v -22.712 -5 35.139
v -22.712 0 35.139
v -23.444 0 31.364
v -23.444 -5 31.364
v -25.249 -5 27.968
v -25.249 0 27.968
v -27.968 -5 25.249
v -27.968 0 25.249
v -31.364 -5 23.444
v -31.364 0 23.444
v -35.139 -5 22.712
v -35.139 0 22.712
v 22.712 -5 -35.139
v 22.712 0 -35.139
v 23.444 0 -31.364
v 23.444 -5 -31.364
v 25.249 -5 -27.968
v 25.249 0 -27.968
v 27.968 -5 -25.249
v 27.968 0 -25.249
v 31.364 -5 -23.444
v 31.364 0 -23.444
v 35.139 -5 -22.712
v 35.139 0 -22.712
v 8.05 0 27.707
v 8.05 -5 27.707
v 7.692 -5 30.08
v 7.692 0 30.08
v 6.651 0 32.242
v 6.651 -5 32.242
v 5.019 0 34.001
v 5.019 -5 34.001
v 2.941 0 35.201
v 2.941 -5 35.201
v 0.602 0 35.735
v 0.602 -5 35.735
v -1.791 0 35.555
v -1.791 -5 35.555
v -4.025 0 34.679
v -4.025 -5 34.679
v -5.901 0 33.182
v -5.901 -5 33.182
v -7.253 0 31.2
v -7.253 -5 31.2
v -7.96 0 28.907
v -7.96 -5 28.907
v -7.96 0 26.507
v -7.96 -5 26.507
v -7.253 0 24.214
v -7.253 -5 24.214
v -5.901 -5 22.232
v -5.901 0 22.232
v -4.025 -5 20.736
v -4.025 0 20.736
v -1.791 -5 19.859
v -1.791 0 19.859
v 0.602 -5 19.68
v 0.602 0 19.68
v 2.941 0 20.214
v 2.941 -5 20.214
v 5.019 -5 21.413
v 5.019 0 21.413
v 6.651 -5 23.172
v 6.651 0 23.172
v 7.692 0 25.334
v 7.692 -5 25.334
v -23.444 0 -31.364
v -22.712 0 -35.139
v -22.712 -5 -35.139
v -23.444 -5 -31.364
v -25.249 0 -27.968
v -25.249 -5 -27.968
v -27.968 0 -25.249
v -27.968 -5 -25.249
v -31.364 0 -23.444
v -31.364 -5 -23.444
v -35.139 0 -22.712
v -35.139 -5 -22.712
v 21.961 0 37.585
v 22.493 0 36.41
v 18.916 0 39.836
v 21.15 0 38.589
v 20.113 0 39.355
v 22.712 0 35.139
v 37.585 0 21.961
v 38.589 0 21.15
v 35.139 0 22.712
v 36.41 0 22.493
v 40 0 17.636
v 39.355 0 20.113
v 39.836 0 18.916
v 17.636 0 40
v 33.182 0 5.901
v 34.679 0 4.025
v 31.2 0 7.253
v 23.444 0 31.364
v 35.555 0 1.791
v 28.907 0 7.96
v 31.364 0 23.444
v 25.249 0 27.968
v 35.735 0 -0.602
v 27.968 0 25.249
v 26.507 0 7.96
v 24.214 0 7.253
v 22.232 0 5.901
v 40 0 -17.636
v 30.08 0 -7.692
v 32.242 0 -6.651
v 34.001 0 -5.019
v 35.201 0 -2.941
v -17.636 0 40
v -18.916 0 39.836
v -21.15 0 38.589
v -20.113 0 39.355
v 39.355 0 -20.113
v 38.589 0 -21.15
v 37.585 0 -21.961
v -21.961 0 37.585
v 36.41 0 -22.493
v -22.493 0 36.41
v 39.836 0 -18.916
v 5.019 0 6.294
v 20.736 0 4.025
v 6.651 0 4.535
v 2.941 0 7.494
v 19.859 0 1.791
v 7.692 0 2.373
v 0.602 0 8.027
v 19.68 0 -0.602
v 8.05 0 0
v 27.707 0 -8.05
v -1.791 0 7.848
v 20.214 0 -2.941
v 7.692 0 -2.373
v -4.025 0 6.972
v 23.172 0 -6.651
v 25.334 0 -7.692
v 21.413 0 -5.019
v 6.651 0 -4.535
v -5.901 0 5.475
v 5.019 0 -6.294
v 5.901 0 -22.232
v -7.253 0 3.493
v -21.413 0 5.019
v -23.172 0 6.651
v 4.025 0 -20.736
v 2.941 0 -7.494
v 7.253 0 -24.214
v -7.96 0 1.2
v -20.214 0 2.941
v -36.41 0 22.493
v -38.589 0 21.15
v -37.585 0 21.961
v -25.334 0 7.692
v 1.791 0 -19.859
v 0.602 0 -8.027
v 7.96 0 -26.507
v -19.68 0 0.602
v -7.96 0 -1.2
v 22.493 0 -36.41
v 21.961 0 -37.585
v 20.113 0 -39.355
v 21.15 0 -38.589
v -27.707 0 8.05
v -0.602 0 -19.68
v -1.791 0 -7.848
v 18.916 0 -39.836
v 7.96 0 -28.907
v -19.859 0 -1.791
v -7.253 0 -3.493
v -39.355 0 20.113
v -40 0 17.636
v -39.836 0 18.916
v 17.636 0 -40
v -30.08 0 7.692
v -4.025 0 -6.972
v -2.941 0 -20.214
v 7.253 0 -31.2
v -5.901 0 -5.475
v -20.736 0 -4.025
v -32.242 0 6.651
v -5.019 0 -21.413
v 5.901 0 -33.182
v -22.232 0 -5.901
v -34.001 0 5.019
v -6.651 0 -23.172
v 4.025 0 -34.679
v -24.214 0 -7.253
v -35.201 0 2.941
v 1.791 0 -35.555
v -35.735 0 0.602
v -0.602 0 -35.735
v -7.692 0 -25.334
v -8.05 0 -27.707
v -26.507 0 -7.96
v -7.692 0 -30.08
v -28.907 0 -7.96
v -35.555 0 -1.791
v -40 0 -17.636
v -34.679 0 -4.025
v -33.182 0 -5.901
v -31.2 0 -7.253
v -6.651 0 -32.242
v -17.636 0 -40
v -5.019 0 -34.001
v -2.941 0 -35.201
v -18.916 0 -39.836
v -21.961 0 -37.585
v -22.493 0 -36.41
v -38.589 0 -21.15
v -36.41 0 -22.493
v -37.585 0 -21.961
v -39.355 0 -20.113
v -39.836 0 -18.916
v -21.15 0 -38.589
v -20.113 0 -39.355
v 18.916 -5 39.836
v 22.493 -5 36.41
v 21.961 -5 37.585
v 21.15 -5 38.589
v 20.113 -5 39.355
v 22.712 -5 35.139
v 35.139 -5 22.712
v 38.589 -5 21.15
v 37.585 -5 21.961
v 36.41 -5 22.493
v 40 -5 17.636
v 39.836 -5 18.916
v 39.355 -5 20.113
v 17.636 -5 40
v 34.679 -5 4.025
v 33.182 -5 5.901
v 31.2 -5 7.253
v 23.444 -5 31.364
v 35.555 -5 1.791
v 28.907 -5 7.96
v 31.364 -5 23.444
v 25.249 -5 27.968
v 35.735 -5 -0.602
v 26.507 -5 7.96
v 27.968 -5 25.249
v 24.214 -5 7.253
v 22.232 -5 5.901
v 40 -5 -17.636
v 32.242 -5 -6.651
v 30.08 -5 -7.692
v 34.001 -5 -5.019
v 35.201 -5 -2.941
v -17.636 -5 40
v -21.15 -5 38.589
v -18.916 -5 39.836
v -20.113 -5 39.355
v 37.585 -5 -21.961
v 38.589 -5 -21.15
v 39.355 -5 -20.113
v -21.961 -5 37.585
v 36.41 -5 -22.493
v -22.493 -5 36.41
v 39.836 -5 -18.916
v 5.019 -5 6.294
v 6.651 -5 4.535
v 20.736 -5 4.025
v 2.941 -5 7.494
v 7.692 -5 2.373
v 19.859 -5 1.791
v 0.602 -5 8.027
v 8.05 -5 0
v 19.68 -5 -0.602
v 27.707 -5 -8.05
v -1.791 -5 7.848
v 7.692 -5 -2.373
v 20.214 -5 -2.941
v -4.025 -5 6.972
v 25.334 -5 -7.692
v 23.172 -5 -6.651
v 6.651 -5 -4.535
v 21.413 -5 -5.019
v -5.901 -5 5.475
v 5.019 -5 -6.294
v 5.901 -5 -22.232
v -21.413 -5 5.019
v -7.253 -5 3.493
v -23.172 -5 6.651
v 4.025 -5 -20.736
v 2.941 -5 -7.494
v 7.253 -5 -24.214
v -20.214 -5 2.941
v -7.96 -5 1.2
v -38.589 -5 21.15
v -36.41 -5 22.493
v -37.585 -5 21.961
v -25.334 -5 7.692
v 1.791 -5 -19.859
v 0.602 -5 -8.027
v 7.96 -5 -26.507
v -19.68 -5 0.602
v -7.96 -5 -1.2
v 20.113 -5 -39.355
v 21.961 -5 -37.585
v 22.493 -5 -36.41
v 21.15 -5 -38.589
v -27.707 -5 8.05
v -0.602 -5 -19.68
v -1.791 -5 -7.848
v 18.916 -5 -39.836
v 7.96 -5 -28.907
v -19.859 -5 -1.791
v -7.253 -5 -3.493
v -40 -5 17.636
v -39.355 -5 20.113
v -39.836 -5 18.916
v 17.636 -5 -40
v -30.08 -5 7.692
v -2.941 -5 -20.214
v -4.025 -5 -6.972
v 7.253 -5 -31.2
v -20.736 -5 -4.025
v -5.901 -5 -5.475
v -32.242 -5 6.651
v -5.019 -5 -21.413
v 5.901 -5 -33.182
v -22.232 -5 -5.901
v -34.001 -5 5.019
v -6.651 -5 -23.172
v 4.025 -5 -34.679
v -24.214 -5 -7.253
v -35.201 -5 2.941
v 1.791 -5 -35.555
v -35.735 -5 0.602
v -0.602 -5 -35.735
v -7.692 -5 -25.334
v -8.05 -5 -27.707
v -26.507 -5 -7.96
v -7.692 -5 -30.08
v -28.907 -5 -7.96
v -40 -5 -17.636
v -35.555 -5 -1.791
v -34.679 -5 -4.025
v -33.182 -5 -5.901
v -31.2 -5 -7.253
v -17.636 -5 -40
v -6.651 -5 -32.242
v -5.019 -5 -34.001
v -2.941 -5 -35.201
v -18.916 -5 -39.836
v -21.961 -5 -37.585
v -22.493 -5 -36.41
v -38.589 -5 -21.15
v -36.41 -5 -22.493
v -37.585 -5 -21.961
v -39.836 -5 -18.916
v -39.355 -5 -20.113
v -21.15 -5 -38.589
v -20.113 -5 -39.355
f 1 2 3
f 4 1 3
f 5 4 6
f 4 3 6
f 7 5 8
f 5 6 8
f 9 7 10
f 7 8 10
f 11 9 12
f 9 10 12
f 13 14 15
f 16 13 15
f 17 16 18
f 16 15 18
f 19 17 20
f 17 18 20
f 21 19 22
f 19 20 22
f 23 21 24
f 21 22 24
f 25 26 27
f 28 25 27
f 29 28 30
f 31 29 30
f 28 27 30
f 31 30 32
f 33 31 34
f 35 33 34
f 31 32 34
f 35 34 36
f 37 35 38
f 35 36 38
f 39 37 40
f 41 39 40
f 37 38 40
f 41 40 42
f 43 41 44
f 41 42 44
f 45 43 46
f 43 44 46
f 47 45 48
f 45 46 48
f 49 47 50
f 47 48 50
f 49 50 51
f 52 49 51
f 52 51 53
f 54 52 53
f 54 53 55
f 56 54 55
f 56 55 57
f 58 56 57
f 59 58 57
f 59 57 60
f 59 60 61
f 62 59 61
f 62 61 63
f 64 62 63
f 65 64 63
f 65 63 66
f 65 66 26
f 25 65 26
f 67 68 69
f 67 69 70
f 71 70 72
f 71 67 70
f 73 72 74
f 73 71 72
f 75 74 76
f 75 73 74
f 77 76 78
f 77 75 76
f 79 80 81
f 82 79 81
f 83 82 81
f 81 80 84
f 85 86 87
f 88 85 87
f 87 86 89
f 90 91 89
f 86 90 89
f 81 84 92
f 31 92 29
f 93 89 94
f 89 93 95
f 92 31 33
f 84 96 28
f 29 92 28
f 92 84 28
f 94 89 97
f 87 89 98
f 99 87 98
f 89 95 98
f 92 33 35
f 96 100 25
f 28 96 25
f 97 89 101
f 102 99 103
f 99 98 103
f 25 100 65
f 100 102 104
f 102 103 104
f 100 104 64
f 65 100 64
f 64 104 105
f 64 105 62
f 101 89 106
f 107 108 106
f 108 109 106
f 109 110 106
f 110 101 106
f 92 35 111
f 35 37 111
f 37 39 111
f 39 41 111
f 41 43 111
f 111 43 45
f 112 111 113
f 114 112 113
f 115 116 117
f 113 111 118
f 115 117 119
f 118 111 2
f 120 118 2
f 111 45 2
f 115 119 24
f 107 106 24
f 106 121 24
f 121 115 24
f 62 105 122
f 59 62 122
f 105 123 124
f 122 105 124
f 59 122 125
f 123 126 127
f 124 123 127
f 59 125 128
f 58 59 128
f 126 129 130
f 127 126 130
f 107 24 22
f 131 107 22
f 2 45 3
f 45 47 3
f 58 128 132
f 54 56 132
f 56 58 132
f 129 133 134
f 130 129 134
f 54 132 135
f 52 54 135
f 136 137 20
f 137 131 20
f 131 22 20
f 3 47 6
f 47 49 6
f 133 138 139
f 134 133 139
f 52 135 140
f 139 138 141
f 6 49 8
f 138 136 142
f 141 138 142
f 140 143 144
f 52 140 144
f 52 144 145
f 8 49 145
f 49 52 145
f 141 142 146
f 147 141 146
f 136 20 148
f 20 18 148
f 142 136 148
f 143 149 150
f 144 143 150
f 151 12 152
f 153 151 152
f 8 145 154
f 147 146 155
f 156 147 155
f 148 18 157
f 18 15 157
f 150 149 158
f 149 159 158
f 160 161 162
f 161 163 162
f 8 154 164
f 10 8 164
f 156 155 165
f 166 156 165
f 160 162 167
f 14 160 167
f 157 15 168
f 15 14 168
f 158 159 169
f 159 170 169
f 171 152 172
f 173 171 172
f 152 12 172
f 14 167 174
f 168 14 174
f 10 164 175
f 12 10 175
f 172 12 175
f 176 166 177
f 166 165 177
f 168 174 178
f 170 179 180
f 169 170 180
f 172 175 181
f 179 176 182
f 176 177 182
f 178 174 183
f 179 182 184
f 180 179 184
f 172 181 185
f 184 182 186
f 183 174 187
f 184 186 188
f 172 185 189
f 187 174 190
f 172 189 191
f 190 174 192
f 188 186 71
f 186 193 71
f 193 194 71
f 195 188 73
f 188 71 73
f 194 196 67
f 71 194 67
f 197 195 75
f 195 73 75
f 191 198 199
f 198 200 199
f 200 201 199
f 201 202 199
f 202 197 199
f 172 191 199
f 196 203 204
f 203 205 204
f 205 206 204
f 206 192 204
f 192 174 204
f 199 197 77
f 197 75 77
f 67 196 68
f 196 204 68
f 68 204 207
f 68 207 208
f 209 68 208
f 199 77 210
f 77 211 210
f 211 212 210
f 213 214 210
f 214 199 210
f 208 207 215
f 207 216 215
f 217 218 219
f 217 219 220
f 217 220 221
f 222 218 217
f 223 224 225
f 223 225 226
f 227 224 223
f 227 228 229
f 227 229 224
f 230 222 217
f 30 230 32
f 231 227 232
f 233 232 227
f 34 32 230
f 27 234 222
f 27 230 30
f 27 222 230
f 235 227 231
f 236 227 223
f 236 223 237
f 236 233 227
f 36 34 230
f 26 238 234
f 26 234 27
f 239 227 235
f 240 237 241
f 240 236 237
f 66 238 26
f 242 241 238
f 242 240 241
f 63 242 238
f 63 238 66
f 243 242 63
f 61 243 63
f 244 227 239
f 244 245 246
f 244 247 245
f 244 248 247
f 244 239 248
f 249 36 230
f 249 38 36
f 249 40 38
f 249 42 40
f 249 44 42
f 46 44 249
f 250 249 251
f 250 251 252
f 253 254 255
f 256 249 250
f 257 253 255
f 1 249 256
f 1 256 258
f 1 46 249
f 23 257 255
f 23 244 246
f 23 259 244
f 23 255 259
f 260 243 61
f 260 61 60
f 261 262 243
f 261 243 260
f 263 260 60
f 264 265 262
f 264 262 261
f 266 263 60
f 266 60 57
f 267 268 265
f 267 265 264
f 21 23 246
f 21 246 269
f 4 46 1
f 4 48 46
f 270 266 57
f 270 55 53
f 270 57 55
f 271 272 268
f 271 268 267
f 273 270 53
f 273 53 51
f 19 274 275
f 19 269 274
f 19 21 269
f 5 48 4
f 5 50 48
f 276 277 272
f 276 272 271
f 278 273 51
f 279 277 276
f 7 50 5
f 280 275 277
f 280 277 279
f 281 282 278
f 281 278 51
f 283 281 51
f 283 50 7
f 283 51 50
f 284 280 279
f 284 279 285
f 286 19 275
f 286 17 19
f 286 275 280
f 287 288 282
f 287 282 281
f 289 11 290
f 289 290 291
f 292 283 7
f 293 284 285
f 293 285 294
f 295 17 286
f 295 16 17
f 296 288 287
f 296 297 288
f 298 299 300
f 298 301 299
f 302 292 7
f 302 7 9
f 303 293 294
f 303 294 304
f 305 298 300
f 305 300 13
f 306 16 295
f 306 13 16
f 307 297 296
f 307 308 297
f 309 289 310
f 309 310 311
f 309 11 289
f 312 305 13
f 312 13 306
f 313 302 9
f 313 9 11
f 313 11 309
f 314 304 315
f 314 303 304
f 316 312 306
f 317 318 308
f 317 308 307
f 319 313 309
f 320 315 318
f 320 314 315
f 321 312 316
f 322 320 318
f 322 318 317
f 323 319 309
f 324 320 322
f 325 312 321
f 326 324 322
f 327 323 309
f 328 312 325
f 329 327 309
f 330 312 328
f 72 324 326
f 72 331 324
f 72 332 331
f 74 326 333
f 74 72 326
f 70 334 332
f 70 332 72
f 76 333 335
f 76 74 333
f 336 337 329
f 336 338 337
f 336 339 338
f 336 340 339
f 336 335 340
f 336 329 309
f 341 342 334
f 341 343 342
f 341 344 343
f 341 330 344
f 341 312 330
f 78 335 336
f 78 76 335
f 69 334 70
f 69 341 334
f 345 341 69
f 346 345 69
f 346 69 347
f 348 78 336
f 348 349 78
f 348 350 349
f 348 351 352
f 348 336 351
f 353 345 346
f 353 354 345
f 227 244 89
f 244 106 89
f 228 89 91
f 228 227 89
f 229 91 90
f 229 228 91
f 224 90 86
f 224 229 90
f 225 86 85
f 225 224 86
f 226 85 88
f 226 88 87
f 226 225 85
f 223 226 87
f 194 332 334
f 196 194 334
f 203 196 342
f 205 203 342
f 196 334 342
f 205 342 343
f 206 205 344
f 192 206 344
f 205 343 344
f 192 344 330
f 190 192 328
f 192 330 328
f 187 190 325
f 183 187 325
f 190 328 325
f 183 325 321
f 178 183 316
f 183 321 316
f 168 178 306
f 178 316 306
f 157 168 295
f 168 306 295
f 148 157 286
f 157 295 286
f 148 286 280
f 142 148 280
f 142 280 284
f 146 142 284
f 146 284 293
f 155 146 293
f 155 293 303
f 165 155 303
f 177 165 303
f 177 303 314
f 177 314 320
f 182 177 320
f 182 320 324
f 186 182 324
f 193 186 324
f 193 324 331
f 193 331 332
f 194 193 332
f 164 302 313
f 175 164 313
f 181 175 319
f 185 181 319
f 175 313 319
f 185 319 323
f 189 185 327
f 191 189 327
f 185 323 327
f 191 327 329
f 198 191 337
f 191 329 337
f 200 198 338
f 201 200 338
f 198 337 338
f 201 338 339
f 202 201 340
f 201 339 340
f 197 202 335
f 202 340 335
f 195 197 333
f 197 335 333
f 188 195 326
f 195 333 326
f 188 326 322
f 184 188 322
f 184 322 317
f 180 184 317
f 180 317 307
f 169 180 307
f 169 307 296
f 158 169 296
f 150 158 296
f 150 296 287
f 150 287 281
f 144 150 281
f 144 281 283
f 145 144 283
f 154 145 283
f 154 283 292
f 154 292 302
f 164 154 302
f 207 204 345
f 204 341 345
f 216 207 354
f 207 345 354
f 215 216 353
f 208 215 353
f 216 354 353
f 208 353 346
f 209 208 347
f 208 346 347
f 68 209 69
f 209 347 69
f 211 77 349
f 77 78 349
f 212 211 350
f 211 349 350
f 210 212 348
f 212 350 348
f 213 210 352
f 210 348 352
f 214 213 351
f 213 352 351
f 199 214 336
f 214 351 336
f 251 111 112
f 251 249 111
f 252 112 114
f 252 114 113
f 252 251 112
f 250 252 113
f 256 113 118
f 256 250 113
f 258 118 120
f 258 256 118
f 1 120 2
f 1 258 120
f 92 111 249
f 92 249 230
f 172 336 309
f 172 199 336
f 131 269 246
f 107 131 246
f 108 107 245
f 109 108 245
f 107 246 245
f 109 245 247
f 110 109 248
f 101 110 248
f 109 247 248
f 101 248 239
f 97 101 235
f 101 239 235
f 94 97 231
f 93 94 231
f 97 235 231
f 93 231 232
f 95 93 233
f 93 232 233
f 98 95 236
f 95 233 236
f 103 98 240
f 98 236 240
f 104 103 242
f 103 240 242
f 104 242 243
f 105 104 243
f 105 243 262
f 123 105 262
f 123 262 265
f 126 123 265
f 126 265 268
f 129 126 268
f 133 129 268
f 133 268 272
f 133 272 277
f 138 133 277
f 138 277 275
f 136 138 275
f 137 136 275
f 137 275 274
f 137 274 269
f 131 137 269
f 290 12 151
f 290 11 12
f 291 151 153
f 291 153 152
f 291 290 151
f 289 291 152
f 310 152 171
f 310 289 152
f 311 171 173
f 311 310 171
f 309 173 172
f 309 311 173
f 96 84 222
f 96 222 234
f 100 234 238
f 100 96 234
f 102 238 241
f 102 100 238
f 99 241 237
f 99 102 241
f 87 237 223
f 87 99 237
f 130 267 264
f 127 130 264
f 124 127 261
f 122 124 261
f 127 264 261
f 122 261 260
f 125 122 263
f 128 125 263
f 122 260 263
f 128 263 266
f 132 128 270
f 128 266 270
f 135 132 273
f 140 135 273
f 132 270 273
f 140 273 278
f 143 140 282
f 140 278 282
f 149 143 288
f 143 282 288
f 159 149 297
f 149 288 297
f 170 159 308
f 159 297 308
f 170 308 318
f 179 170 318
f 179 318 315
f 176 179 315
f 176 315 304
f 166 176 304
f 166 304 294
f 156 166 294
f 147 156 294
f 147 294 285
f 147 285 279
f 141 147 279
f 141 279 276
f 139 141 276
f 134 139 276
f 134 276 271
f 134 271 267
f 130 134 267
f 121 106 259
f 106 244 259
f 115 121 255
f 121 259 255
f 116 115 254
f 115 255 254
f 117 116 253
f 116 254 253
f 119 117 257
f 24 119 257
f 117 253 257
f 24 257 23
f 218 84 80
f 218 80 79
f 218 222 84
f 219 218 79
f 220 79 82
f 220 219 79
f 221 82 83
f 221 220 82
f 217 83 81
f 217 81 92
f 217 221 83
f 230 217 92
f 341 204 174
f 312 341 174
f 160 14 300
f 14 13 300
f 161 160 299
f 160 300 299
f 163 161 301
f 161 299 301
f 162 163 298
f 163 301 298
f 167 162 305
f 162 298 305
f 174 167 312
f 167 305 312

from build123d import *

# Parameters (mm, degrees)
F1_DEPTH        = 5
F4_R            = 8.05
F5_DEPTH        = 5.001
F6_R            = 5.08
F7_R            = 8.05
F8_DEPTH        = 5.001
F8_COPIES_COUNT = 4


# Not quite as in the source:
# - a pattern or mirror of a feature is missing from the dataset's text; its kind, count and spacing are read off the source's solid


with BuildPart() as f1:
    # F0 (on Front) → F1 (new body)
    with BuildSketch(Plane.XZ):
        with BuildLine():
            Line((-40, 23.4314575051), (-40, 0))
            Line((-40, 0), (0, 0))
            Line((0, 0), (0, 40))
            Line((0, 40), (-23.4314575051, 40))
            ThreePointArc((-23.4314575051, 40), (-26.5071641246, 26.5071641246), (-40, 23.4314575051))
        make_face()
    extrude(amount=F1_DEPTH)

    # F2: F1 across face


with BuildPart() as f1_1:
    add(f1.part)
    add(f1.part.mirror(Plane(origin=(0, -2.5, 20), x_dir=(0, 1, 0), z_dir=(1, 0, 0))))

    # F3: F1 across face


with BuildPart() as f1_2:
    add(f1_1.part)
    add(f1_1.part.mirror(Plane(origin=(0, -2.5, 0), x_dir=(1, 0, 0), z_dir=(0, 0, -1))))

    # F4 (on face) → F5 (cut, through all)
    with BuildSketch(Plane.XZ.offset(5)):
        Circle(F4_R)
    extrude(amount=-F5_DEPTH, mode=Mode.SUBTRACT)

    # F6
    f6_edges = [f1_2.edges().sort_by_distance(p)[0] for p in [
        (-40, -2.5, 23.431458),
        (-23.431458, -2.5, 40),
        (23.431458, -2.5, 40),
        (40, -2.5, 23.431458),
        (40, -2.5, -23.431458),
        (23.431458, -2.5, -40),
        (-40, -2.5, -23.431458),
        (-23.431458, -2.5, -40),
    ]]
    fillet(f6_edges, radius=F6_R)

    # F7 (on face) → F8 (cut, through all)
    with BuildSketch(Plane.XZ.offset(5)):
        with Locations((0, 27.7070477605)):
            Circle(F7_R)
    f8 = extrude(amount=-F8_DEPTH, mode=Mode.SUBTRACT)

    # F8_copies: F8 ×4 about axis
    f8_copies_axis = Axis((0, 0, 0), (0, 1, 0))
    for i in range(1, F8_COPIES_COUNT):
        add(f8.rotate(f8_copies_axis, i * 360 / F8_COPIES_COUNT), mode=Mode.SUBTRACT)


solid = f1_2.part
